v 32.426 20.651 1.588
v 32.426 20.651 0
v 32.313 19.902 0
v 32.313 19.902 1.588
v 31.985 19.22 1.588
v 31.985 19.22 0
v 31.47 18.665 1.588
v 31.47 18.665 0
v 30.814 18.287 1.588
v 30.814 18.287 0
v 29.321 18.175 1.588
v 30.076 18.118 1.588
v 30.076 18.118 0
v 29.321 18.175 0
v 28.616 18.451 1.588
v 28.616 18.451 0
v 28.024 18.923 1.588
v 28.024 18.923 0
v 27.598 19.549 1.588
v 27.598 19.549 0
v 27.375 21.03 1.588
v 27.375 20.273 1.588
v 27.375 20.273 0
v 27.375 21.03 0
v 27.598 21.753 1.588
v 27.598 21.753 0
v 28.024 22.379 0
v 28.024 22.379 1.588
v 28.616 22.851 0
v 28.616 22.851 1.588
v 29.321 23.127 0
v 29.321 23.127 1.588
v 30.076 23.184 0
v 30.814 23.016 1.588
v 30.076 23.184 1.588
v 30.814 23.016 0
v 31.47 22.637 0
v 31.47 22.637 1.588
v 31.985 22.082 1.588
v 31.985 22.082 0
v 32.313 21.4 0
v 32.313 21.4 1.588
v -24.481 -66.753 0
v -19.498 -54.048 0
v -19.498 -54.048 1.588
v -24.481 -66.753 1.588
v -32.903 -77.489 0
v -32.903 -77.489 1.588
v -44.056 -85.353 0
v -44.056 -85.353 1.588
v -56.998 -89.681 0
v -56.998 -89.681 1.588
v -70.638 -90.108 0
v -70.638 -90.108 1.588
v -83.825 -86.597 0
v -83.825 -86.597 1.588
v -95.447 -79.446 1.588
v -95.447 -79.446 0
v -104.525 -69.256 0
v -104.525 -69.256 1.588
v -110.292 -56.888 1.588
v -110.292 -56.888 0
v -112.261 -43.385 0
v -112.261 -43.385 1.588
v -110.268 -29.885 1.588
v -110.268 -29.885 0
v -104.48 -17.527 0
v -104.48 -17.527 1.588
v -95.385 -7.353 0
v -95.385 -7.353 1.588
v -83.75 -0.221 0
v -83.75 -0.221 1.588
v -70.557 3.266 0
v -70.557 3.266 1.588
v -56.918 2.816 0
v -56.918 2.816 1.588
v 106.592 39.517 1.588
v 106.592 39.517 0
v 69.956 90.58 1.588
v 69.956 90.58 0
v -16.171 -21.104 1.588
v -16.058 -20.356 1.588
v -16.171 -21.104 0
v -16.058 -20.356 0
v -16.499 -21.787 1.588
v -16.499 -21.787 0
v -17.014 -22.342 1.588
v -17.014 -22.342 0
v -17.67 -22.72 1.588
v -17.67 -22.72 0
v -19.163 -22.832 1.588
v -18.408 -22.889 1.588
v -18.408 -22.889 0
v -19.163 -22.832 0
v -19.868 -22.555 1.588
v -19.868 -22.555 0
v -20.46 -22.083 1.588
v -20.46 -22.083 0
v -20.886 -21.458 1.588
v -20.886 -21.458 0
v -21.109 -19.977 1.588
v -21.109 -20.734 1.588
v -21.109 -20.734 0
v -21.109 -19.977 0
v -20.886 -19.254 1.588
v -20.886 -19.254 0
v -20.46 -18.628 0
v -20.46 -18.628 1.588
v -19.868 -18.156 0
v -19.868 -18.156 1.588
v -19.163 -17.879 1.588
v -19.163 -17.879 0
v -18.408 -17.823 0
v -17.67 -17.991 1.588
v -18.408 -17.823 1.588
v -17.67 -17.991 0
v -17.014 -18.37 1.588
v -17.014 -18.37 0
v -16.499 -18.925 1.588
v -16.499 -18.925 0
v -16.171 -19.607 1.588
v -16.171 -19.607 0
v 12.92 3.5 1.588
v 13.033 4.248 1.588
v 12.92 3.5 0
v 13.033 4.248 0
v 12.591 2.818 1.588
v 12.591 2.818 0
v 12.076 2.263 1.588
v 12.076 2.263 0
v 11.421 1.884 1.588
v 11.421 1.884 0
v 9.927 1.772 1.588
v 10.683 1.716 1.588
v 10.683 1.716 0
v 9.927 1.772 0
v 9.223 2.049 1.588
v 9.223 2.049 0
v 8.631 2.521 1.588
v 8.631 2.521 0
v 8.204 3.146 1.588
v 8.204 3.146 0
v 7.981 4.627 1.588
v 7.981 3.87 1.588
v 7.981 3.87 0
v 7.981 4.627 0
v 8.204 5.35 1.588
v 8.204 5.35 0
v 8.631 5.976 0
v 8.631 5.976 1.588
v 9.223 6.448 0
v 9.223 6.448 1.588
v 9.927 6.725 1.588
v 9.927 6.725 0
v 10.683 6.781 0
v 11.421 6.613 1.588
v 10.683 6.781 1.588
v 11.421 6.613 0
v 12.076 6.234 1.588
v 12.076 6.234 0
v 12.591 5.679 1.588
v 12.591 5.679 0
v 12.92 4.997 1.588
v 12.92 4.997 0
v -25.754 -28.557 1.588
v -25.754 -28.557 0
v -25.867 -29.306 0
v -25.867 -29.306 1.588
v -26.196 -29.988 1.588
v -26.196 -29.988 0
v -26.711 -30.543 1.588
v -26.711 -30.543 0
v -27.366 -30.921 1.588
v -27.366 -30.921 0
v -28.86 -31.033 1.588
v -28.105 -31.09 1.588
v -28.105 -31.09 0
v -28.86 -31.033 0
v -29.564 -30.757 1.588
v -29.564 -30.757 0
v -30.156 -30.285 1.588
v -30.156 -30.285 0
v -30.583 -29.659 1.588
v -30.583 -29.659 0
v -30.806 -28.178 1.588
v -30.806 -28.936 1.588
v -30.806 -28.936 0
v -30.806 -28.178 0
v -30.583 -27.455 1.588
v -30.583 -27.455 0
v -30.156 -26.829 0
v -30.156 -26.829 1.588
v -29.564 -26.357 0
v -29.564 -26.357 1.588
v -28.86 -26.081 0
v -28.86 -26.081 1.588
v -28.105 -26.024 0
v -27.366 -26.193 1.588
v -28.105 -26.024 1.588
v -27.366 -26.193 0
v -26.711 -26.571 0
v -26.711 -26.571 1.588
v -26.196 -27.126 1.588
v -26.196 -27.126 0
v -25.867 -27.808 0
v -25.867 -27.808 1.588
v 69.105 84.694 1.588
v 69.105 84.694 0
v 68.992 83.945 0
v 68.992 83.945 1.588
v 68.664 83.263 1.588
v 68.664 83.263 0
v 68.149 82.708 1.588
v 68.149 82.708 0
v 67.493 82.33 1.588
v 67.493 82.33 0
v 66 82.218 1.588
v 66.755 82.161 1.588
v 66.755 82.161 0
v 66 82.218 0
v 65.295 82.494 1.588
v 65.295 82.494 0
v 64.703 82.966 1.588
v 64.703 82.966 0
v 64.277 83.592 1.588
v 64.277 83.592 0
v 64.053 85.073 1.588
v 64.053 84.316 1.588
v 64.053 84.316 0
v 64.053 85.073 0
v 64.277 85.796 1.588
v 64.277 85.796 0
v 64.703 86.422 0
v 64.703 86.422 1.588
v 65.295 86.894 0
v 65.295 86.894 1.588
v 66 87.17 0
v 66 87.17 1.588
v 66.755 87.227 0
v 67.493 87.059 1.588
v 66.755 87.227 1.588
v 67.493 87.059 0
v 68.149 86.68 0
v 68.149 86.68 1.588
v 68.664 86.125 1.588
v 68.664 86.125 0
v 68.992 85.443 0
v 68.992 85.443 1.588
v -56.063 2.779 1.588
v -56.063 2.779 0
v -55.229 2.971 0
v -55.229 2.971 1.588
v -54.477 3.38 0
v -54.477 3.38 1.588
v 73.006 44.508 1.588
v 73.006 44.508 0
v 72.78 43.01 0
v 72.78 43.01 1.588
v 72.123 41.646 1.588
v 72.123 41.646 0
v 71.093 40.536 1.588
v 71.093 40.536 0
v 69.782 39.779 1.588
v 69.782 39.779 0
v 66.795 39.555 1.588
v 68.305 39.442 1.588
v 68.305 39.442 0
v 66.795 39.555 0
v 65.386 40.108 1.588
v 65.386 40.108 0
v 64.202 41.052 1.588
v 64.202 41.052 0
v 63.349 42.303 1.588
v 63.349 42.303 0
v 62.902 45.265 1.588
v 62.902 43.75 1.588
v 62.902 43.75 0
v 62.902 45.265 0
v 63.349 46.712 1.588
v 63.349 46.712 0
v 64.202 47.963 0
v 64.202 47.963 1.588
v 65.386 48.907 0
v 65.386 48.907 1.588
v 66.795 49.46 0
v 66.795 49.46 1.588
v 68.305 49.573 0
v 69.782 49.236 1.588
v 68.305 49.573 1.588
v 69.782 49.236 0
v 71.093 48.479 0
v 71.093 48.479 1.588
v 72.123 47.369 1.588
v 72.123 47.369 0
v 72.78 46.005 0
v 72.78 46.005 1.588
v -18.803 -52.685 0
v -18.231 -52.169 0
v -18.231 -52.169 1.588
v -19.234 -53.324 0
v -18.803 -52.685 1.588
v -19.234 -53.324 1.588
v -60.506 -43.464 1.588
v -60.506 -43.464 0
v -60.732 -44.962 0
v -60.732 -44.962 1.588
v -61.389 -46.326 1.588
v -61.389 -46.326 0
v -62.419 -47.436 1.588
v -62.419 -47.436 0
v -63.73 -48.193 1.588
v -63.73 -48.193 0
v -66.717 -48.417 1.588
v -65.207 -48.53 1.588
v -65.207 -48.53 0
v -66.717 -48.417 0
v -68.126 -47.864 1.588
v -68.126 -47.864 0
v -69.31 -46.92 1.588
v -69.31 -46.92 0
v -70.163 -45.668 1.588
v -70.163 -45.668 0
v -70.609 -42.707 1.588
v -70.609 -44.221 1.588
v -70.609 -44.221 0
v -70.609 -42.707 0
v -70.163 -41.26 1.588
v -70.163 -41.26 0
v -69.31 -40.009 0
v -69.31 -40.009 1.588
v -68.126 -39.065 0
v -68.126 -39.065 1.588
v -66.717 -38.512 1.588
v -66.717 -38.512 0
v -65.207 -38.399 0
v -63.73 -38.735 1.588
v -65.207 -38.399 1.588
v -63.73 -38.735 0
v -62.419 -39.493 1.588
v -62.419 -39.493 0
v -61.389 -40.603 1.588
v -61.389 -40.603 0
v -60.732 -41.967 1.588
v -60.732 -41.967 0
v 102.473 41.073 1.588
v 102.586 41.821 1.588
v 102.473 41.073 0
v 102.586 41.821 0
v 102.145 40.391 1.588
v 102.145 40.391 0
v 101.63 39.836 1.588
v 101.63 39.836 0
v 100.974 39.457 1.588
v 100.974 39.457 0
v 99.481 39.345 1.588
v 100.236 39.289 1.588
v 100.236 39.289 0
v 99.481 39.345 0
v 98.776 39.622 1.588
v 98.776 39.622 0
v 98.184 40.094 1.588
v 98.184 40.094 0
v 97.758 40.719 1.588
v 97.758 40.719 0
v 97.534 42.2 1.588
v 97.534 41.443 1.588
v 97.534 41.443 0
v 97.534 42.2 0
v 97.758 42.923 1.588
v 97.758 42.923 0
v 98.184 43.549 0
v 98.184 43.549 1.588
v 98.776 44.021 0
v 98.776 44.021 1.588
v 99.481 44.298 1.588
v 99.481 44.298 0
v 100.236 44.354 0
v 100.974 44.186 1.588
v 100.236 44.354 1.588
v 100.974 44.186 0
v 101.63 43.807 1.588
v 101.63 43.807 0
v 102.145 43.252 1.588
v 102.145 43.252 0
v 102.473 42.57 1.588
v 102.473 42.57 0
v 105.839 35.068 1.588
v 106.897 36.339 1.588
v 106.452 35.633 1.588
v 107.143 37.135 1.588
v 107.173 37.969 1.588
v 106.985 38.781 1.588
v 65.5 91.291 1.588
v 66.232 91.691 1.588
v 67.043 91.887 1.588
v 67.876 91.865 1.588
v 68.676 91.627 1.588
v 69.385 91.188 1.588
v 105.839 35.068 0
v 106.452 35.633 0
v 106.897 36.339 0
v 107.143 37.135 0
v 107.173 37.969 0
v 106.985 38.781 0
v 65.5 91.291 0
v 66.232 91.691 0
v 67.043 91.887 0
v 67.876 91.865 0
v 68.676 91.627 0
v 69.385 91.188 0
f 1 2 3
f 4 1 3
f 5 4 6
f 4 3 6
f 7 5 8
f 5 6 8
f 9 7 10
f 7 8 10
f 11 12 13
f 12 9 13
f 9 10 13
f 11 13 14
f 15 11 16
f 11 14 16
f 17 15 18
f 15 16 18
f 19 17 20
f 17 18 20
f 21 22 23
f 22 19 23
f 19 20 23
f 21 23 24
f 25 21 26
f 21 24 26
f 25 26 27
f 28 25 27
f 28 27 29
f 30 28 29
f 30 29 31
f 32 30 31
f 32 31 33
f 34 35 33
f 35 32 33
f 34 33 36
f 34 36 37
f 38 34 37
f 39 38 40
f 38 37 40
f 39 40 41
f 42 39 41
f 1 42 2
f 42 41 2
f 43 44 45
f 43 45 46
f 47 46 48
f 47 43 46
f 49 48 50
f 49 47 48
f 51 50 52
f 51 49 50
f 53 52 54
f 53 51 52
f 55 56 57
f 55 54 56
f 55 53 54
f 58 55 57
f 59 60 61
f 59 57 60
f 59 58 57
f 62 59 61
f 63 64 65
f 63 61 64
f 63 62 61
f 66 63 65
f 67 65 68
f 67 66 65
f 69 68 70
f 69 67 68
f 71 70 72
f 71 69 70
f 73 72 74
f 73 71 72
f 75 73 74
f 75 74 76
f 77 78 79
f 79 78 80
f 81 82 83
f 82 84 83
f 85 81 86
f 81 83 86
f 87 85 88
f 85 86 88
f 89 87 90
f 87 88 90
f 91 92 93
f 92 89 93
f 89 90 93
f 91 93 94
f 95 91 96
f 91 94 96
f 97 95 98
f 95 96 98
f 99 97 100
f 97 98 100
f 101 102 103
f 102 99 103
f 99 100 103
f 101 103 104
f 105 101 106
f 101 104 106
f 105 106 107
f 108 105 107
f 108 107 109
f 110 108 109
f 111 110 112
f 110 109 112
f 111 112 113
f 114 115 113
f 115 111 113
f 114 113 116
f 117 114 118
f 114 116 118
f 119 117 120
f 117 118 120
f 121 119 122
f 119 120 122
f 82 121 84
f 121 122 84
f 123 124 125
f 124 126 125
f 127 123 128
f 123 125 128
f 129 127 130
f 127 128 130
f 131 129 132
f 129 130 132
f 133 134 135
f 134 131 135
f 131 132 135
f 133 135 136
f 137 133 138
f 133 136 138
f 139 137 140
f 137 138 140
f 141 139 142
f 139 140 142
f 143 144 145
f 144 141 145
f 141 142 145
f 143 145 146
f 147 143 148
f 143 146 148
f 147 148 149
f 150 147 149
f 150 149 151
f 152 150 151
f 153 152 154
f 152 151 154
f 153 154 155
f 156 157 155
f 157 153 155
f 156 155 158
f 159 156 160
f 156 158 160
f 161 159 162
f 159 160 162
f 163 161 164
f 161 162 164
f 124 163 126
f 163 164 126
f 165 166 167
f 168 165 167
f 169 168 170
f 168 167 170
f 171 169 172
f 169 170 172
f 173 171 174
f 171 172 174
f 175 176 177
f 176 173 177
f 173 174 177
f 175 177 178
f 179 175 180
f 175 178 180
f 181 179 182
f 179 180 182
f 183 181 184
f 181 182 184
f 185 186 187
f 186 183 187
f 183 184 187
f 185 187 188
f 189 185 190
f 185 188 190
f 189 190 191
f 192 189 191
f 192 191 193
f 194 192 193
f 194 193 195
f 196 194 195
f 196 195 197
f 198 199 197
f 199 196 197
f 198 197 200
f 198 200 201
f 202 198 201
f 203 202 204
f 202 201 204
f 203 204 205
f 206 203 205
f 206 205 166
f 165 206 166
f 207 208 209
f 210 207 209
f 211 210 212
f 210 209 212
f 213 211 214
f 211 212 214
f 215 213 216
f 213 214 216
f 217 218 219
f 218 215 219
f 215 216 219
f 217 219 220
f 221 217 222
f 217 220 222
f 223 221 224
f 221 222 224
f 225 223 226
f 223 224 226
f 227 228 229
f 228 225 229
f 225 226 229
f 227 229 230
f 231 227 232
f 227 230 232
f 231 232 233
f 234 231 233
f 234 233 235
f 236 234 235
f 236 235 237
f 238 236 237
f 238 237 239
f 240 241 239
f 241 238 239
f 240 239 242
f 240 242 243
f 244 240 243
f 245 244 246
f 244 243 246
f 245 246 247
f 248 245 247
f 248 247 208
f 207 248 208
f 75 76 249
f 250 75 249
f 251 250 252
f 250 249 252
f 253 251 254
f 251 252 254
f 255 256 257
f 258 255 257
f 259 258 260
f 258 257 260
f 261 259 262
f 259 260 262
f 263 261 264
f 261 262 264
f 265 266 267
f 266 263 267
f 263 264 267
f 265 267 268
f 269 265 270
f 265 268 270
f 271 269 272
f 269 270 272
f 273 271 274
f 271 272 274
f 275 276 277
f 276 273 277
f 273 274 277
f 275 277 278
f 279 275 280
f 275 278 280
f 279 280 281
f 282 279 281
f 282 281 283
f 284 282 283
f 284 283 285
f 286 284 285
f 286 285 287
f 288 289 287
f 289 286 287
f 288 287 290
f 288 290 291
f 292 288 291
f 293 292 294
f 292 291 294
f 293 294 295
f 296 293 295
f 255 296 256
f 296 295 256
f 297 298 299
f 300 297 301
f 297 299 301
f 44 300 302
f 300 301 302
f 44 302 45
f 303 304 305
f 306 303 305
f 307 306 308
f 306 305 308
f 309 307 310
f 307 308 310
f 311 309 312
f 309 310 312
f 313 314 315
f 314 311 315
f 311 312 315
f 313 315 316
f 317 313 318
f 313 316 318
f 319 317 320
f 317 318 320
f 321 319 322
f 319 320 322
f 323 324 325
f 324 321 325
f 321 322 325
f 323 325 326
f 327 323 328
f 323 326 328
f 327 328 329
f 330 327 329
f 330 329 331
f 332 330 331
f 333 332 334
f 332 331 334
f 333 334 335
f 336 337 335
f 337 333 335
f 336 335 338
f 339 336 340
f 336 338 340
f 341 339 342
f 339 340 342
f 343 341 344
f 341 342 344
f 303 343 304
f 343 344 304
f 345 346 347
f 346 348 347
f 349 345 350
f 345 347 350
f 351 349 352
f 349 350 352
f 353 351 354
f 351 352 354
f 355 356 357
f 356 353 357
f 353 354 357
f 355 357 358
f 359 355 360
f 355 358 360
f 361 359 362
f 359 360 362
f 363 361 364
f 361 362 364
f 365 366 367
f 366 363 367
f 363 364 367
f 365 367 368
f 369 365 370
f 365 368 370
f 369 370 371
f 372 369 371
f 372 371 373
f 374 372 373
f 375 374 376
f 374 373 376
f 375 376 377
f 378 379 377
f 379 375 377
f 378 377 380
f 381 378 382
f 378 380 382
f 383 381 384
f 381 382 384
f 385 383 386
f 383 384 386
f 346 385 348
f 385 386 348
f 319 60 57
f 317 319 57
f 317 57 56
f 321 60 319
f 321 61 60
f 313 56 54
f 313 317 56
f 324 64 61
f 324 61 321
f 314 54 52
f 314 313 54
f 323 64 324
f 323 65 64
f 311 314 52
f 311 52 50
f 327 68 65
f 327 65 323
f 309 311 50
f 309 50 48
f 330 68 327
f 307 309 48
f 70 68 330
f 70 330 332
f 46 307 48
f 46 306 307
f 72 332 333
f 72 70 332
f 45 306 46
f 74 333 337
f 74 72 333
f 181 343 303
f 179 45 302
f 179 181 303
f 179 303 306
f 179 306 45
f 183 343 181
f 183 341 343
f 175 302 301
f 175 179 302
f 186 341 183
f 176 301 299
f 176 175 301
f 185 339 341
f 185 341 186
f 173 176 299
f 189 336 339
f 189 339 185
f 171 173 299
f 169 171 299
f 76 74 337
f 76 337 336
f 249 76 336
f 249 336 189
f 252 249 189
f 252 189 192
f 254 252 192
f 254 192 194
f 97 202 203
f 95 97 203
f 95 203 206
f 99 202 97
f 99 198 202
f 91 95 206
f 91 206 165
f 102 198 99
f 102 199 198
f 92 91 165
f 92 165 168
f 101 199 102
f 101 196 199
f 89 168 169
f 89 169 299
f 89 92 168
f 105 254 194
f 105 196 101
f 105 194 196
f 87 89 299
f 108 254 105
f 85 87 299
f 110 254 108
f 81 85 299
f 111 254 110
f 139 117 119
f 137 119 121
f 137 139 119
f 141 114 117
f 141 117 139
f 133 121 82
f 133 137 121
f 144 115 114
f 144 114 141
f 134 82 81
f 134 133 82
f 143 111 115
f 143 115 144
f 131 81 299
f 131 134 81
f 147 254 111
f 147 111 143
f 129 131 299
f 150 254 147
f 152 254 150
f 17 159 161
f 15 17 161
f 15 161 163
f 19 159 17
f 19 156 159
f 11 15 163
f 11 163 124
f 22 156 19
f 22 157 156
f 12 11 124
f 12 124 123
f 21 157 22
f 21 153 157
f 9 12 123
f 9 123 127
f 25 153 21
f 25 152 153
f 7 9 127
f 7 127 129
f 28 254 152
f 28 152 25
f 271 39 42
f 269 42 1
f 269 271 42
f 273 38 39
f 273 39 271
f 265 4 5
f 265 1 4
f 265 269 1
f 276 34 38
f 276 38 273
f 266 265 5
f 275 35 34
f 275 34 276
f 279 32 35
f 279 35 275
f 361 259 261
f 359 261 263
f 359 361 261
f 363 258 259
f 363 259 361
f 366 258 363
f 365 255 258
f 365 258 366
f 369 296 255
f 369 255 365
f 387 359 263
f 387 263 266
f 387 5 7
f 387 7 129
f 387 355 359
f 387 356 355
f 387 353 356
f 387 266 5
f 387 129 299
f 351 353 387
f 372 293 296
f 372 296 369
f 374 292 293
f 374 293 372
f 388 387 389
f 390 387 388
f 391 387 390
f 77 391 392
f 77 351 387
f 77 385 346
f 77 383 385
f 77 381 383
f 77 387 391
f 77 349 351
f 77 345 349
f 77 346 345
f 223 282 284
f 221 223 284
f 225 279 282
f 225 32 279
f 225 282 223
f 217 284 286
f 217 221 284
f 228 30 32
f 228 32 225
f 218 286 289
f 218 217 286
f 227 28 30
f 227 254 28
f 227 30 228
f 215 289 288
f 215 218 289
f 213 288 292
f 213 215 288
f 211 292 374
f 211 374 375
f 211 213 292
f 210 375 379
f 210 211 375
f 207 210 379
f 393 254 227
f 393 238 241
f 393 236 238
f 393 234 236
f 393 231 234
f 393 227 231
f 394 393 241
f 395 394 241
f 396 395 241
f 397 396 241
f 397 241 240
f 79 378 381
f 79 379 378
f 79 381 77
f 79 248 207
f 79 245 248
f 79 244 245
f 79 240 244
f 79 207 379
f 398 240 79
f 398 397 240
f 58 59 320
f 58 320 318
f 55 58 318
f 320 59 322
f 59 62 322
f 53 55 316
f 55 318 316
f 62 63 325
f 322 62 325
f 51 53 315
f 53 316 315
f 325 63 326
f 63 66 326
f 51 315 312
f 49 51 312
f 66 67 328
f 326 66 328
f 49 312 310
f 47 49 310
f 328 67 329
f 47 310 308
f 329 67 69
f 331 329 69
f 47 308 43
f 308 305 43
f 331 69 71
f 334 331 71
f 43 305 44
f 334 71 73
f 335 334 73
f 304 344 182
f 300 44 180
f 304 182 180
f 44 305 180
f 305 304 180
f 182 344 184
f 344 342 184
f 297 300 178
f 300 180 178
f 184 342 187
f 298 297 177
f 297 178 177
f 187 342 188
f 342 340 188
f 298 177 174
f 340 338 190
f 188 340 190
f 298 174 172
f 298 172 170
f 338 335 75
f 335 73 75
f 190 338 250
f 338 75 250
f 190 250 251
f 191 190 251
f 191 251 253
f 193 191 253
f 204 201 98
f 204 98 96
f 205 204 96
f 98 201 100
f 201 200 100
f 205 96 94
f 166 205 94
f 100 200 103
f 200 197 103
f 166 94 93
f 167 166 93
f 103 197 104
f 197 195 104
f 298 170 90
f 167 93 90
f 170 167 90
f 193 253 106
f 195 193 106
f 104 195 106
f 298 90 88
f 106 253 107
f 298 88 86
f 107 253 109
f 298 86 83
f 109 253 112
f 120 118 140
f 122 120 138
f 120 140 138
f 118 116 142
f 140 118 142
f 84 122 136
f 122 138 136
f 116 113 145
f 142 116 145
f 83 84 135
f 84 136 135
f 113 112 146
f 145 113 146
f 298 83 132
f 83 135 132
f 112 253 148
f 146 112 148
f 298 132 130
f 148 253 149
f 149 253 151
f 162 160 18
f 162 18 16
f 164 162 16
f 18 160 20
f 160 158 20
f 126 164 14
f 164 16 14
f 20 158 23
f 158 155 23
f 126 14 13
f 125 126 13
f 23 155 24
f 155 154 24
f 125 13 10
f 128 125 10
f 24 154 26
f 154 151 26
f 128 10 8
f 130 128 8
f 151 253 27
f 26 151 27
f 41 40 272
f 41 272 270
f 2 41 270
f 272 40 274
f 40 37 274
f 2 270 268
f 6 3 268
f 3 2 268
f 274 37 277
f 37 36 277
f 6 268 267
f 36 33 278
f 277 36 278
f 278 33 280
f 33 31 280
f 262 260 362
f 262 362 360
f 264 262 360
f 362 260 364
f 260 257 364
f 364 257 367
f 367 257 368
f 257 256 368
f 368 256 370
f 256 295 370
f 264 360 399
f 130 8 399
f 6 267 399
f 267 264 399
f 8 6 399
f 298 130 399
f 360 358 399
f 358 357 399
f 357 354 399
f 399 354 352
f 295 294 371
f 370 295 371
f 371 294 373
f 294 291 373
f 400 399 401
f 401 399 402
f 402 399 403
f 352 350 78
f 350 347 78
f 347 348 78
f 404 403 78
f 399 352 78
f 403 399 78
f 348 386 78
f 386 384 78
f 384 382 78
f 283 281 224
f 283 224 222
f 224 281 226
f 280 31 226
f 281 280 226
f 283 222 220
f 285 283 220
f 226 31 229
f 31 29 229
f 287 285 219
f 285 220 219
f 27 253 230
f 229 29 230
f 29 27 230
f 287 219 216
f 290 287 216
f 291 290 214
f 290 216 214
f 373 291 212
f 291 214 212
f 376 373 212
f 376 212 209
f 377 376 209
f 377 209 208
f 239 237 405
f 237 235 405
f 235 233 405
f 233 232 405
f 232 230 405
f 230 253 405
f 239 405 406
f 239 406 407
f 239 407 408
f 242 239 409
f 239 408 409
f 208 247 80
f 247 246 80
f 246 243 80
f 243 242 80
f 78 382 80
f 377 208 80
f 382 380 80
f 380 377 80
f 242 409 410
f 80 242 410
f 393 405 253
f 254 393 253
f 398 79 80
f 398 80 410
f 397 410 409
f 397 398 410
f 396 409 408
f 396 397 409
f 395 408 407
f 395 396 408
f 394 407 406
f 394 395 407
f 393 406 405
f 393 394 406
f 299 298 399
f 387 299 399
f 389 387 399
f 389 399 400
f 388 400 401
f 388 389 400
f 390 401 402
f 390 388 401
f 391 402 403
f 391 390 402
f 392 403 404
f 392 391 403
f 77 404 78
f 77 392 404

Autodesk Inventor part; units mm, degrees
ref_plane "YZ Plane" through (0, 0, 0) normal (1, 0, 0) x (0, 1, 0)
ref_plane "XZ Plane" through (0, 0, 0) normal (0, 1, 0) x (-1, 0, 0)
ref_plane "XY Plane" through (0, 0, 0) normal (0, 0, 1) x (1, 0, 0)
sketch "Sketch2" plane through (0, 0, 0) normal (0, 0, 1) x (1, 0, 0)
  circle A0 centre (-65.2715, -43.4254) radius 46.99
  line L0 (-19.2425, -52.8797) -> (108.4608, 36.9121)
  line L1 (108.4608, 36.9121) -> (68.0869, 93.186)
  line L2 (68.0869, 93.186) -> (-55.5981, 2.5581)
  circle A1 centre (100.0461, 41.8214) radius 2.54
  circle A2 centre (66.5651, 84.6941) radius 2.54
  circle A3 centre (-65.5862, -43.4643) radius 5.08
  circle A4 centre (67.9257, 44.5075) radius 5.08
  circle A5 centre (29.8863, 20.6511) radius 2.54
  circle A6 centre (10.4927, 4.2484) radius 2.54
  circle A7 centre (-18.5977, -20.3557) radius 2.54
  circle A8 centre (-28.2944, -28.557) radius 2.54
  point P0 (0, 0)
  dimension "d45" = 93.98
  dimension "d46" = 127.7033
  dimension "d47" = 153.3343
  dimension "d48" = 5.08
  dimension "d49" = 5.08
  dimension "d50" = 10.16
  dimension "d51" = 10.16
  dimension "d52" = 5.08
  dimension "d53" = 5.08
  dimension "d54" = 5.08
  dimension "d55" = 5.08
extrude "Extrusion2" add sketch "Sketch2" along normal blind 1.5875
fillet "Fillet2" radius 3.175 4 edges at (-55.5981, 2.5581, 0.7937) (68.0869, 93.186, 0.7937) (108.4608, 36.9121, 0.7937) (-19.2425, -52.8797, 0.7937)
properties part number "Intake poly"
